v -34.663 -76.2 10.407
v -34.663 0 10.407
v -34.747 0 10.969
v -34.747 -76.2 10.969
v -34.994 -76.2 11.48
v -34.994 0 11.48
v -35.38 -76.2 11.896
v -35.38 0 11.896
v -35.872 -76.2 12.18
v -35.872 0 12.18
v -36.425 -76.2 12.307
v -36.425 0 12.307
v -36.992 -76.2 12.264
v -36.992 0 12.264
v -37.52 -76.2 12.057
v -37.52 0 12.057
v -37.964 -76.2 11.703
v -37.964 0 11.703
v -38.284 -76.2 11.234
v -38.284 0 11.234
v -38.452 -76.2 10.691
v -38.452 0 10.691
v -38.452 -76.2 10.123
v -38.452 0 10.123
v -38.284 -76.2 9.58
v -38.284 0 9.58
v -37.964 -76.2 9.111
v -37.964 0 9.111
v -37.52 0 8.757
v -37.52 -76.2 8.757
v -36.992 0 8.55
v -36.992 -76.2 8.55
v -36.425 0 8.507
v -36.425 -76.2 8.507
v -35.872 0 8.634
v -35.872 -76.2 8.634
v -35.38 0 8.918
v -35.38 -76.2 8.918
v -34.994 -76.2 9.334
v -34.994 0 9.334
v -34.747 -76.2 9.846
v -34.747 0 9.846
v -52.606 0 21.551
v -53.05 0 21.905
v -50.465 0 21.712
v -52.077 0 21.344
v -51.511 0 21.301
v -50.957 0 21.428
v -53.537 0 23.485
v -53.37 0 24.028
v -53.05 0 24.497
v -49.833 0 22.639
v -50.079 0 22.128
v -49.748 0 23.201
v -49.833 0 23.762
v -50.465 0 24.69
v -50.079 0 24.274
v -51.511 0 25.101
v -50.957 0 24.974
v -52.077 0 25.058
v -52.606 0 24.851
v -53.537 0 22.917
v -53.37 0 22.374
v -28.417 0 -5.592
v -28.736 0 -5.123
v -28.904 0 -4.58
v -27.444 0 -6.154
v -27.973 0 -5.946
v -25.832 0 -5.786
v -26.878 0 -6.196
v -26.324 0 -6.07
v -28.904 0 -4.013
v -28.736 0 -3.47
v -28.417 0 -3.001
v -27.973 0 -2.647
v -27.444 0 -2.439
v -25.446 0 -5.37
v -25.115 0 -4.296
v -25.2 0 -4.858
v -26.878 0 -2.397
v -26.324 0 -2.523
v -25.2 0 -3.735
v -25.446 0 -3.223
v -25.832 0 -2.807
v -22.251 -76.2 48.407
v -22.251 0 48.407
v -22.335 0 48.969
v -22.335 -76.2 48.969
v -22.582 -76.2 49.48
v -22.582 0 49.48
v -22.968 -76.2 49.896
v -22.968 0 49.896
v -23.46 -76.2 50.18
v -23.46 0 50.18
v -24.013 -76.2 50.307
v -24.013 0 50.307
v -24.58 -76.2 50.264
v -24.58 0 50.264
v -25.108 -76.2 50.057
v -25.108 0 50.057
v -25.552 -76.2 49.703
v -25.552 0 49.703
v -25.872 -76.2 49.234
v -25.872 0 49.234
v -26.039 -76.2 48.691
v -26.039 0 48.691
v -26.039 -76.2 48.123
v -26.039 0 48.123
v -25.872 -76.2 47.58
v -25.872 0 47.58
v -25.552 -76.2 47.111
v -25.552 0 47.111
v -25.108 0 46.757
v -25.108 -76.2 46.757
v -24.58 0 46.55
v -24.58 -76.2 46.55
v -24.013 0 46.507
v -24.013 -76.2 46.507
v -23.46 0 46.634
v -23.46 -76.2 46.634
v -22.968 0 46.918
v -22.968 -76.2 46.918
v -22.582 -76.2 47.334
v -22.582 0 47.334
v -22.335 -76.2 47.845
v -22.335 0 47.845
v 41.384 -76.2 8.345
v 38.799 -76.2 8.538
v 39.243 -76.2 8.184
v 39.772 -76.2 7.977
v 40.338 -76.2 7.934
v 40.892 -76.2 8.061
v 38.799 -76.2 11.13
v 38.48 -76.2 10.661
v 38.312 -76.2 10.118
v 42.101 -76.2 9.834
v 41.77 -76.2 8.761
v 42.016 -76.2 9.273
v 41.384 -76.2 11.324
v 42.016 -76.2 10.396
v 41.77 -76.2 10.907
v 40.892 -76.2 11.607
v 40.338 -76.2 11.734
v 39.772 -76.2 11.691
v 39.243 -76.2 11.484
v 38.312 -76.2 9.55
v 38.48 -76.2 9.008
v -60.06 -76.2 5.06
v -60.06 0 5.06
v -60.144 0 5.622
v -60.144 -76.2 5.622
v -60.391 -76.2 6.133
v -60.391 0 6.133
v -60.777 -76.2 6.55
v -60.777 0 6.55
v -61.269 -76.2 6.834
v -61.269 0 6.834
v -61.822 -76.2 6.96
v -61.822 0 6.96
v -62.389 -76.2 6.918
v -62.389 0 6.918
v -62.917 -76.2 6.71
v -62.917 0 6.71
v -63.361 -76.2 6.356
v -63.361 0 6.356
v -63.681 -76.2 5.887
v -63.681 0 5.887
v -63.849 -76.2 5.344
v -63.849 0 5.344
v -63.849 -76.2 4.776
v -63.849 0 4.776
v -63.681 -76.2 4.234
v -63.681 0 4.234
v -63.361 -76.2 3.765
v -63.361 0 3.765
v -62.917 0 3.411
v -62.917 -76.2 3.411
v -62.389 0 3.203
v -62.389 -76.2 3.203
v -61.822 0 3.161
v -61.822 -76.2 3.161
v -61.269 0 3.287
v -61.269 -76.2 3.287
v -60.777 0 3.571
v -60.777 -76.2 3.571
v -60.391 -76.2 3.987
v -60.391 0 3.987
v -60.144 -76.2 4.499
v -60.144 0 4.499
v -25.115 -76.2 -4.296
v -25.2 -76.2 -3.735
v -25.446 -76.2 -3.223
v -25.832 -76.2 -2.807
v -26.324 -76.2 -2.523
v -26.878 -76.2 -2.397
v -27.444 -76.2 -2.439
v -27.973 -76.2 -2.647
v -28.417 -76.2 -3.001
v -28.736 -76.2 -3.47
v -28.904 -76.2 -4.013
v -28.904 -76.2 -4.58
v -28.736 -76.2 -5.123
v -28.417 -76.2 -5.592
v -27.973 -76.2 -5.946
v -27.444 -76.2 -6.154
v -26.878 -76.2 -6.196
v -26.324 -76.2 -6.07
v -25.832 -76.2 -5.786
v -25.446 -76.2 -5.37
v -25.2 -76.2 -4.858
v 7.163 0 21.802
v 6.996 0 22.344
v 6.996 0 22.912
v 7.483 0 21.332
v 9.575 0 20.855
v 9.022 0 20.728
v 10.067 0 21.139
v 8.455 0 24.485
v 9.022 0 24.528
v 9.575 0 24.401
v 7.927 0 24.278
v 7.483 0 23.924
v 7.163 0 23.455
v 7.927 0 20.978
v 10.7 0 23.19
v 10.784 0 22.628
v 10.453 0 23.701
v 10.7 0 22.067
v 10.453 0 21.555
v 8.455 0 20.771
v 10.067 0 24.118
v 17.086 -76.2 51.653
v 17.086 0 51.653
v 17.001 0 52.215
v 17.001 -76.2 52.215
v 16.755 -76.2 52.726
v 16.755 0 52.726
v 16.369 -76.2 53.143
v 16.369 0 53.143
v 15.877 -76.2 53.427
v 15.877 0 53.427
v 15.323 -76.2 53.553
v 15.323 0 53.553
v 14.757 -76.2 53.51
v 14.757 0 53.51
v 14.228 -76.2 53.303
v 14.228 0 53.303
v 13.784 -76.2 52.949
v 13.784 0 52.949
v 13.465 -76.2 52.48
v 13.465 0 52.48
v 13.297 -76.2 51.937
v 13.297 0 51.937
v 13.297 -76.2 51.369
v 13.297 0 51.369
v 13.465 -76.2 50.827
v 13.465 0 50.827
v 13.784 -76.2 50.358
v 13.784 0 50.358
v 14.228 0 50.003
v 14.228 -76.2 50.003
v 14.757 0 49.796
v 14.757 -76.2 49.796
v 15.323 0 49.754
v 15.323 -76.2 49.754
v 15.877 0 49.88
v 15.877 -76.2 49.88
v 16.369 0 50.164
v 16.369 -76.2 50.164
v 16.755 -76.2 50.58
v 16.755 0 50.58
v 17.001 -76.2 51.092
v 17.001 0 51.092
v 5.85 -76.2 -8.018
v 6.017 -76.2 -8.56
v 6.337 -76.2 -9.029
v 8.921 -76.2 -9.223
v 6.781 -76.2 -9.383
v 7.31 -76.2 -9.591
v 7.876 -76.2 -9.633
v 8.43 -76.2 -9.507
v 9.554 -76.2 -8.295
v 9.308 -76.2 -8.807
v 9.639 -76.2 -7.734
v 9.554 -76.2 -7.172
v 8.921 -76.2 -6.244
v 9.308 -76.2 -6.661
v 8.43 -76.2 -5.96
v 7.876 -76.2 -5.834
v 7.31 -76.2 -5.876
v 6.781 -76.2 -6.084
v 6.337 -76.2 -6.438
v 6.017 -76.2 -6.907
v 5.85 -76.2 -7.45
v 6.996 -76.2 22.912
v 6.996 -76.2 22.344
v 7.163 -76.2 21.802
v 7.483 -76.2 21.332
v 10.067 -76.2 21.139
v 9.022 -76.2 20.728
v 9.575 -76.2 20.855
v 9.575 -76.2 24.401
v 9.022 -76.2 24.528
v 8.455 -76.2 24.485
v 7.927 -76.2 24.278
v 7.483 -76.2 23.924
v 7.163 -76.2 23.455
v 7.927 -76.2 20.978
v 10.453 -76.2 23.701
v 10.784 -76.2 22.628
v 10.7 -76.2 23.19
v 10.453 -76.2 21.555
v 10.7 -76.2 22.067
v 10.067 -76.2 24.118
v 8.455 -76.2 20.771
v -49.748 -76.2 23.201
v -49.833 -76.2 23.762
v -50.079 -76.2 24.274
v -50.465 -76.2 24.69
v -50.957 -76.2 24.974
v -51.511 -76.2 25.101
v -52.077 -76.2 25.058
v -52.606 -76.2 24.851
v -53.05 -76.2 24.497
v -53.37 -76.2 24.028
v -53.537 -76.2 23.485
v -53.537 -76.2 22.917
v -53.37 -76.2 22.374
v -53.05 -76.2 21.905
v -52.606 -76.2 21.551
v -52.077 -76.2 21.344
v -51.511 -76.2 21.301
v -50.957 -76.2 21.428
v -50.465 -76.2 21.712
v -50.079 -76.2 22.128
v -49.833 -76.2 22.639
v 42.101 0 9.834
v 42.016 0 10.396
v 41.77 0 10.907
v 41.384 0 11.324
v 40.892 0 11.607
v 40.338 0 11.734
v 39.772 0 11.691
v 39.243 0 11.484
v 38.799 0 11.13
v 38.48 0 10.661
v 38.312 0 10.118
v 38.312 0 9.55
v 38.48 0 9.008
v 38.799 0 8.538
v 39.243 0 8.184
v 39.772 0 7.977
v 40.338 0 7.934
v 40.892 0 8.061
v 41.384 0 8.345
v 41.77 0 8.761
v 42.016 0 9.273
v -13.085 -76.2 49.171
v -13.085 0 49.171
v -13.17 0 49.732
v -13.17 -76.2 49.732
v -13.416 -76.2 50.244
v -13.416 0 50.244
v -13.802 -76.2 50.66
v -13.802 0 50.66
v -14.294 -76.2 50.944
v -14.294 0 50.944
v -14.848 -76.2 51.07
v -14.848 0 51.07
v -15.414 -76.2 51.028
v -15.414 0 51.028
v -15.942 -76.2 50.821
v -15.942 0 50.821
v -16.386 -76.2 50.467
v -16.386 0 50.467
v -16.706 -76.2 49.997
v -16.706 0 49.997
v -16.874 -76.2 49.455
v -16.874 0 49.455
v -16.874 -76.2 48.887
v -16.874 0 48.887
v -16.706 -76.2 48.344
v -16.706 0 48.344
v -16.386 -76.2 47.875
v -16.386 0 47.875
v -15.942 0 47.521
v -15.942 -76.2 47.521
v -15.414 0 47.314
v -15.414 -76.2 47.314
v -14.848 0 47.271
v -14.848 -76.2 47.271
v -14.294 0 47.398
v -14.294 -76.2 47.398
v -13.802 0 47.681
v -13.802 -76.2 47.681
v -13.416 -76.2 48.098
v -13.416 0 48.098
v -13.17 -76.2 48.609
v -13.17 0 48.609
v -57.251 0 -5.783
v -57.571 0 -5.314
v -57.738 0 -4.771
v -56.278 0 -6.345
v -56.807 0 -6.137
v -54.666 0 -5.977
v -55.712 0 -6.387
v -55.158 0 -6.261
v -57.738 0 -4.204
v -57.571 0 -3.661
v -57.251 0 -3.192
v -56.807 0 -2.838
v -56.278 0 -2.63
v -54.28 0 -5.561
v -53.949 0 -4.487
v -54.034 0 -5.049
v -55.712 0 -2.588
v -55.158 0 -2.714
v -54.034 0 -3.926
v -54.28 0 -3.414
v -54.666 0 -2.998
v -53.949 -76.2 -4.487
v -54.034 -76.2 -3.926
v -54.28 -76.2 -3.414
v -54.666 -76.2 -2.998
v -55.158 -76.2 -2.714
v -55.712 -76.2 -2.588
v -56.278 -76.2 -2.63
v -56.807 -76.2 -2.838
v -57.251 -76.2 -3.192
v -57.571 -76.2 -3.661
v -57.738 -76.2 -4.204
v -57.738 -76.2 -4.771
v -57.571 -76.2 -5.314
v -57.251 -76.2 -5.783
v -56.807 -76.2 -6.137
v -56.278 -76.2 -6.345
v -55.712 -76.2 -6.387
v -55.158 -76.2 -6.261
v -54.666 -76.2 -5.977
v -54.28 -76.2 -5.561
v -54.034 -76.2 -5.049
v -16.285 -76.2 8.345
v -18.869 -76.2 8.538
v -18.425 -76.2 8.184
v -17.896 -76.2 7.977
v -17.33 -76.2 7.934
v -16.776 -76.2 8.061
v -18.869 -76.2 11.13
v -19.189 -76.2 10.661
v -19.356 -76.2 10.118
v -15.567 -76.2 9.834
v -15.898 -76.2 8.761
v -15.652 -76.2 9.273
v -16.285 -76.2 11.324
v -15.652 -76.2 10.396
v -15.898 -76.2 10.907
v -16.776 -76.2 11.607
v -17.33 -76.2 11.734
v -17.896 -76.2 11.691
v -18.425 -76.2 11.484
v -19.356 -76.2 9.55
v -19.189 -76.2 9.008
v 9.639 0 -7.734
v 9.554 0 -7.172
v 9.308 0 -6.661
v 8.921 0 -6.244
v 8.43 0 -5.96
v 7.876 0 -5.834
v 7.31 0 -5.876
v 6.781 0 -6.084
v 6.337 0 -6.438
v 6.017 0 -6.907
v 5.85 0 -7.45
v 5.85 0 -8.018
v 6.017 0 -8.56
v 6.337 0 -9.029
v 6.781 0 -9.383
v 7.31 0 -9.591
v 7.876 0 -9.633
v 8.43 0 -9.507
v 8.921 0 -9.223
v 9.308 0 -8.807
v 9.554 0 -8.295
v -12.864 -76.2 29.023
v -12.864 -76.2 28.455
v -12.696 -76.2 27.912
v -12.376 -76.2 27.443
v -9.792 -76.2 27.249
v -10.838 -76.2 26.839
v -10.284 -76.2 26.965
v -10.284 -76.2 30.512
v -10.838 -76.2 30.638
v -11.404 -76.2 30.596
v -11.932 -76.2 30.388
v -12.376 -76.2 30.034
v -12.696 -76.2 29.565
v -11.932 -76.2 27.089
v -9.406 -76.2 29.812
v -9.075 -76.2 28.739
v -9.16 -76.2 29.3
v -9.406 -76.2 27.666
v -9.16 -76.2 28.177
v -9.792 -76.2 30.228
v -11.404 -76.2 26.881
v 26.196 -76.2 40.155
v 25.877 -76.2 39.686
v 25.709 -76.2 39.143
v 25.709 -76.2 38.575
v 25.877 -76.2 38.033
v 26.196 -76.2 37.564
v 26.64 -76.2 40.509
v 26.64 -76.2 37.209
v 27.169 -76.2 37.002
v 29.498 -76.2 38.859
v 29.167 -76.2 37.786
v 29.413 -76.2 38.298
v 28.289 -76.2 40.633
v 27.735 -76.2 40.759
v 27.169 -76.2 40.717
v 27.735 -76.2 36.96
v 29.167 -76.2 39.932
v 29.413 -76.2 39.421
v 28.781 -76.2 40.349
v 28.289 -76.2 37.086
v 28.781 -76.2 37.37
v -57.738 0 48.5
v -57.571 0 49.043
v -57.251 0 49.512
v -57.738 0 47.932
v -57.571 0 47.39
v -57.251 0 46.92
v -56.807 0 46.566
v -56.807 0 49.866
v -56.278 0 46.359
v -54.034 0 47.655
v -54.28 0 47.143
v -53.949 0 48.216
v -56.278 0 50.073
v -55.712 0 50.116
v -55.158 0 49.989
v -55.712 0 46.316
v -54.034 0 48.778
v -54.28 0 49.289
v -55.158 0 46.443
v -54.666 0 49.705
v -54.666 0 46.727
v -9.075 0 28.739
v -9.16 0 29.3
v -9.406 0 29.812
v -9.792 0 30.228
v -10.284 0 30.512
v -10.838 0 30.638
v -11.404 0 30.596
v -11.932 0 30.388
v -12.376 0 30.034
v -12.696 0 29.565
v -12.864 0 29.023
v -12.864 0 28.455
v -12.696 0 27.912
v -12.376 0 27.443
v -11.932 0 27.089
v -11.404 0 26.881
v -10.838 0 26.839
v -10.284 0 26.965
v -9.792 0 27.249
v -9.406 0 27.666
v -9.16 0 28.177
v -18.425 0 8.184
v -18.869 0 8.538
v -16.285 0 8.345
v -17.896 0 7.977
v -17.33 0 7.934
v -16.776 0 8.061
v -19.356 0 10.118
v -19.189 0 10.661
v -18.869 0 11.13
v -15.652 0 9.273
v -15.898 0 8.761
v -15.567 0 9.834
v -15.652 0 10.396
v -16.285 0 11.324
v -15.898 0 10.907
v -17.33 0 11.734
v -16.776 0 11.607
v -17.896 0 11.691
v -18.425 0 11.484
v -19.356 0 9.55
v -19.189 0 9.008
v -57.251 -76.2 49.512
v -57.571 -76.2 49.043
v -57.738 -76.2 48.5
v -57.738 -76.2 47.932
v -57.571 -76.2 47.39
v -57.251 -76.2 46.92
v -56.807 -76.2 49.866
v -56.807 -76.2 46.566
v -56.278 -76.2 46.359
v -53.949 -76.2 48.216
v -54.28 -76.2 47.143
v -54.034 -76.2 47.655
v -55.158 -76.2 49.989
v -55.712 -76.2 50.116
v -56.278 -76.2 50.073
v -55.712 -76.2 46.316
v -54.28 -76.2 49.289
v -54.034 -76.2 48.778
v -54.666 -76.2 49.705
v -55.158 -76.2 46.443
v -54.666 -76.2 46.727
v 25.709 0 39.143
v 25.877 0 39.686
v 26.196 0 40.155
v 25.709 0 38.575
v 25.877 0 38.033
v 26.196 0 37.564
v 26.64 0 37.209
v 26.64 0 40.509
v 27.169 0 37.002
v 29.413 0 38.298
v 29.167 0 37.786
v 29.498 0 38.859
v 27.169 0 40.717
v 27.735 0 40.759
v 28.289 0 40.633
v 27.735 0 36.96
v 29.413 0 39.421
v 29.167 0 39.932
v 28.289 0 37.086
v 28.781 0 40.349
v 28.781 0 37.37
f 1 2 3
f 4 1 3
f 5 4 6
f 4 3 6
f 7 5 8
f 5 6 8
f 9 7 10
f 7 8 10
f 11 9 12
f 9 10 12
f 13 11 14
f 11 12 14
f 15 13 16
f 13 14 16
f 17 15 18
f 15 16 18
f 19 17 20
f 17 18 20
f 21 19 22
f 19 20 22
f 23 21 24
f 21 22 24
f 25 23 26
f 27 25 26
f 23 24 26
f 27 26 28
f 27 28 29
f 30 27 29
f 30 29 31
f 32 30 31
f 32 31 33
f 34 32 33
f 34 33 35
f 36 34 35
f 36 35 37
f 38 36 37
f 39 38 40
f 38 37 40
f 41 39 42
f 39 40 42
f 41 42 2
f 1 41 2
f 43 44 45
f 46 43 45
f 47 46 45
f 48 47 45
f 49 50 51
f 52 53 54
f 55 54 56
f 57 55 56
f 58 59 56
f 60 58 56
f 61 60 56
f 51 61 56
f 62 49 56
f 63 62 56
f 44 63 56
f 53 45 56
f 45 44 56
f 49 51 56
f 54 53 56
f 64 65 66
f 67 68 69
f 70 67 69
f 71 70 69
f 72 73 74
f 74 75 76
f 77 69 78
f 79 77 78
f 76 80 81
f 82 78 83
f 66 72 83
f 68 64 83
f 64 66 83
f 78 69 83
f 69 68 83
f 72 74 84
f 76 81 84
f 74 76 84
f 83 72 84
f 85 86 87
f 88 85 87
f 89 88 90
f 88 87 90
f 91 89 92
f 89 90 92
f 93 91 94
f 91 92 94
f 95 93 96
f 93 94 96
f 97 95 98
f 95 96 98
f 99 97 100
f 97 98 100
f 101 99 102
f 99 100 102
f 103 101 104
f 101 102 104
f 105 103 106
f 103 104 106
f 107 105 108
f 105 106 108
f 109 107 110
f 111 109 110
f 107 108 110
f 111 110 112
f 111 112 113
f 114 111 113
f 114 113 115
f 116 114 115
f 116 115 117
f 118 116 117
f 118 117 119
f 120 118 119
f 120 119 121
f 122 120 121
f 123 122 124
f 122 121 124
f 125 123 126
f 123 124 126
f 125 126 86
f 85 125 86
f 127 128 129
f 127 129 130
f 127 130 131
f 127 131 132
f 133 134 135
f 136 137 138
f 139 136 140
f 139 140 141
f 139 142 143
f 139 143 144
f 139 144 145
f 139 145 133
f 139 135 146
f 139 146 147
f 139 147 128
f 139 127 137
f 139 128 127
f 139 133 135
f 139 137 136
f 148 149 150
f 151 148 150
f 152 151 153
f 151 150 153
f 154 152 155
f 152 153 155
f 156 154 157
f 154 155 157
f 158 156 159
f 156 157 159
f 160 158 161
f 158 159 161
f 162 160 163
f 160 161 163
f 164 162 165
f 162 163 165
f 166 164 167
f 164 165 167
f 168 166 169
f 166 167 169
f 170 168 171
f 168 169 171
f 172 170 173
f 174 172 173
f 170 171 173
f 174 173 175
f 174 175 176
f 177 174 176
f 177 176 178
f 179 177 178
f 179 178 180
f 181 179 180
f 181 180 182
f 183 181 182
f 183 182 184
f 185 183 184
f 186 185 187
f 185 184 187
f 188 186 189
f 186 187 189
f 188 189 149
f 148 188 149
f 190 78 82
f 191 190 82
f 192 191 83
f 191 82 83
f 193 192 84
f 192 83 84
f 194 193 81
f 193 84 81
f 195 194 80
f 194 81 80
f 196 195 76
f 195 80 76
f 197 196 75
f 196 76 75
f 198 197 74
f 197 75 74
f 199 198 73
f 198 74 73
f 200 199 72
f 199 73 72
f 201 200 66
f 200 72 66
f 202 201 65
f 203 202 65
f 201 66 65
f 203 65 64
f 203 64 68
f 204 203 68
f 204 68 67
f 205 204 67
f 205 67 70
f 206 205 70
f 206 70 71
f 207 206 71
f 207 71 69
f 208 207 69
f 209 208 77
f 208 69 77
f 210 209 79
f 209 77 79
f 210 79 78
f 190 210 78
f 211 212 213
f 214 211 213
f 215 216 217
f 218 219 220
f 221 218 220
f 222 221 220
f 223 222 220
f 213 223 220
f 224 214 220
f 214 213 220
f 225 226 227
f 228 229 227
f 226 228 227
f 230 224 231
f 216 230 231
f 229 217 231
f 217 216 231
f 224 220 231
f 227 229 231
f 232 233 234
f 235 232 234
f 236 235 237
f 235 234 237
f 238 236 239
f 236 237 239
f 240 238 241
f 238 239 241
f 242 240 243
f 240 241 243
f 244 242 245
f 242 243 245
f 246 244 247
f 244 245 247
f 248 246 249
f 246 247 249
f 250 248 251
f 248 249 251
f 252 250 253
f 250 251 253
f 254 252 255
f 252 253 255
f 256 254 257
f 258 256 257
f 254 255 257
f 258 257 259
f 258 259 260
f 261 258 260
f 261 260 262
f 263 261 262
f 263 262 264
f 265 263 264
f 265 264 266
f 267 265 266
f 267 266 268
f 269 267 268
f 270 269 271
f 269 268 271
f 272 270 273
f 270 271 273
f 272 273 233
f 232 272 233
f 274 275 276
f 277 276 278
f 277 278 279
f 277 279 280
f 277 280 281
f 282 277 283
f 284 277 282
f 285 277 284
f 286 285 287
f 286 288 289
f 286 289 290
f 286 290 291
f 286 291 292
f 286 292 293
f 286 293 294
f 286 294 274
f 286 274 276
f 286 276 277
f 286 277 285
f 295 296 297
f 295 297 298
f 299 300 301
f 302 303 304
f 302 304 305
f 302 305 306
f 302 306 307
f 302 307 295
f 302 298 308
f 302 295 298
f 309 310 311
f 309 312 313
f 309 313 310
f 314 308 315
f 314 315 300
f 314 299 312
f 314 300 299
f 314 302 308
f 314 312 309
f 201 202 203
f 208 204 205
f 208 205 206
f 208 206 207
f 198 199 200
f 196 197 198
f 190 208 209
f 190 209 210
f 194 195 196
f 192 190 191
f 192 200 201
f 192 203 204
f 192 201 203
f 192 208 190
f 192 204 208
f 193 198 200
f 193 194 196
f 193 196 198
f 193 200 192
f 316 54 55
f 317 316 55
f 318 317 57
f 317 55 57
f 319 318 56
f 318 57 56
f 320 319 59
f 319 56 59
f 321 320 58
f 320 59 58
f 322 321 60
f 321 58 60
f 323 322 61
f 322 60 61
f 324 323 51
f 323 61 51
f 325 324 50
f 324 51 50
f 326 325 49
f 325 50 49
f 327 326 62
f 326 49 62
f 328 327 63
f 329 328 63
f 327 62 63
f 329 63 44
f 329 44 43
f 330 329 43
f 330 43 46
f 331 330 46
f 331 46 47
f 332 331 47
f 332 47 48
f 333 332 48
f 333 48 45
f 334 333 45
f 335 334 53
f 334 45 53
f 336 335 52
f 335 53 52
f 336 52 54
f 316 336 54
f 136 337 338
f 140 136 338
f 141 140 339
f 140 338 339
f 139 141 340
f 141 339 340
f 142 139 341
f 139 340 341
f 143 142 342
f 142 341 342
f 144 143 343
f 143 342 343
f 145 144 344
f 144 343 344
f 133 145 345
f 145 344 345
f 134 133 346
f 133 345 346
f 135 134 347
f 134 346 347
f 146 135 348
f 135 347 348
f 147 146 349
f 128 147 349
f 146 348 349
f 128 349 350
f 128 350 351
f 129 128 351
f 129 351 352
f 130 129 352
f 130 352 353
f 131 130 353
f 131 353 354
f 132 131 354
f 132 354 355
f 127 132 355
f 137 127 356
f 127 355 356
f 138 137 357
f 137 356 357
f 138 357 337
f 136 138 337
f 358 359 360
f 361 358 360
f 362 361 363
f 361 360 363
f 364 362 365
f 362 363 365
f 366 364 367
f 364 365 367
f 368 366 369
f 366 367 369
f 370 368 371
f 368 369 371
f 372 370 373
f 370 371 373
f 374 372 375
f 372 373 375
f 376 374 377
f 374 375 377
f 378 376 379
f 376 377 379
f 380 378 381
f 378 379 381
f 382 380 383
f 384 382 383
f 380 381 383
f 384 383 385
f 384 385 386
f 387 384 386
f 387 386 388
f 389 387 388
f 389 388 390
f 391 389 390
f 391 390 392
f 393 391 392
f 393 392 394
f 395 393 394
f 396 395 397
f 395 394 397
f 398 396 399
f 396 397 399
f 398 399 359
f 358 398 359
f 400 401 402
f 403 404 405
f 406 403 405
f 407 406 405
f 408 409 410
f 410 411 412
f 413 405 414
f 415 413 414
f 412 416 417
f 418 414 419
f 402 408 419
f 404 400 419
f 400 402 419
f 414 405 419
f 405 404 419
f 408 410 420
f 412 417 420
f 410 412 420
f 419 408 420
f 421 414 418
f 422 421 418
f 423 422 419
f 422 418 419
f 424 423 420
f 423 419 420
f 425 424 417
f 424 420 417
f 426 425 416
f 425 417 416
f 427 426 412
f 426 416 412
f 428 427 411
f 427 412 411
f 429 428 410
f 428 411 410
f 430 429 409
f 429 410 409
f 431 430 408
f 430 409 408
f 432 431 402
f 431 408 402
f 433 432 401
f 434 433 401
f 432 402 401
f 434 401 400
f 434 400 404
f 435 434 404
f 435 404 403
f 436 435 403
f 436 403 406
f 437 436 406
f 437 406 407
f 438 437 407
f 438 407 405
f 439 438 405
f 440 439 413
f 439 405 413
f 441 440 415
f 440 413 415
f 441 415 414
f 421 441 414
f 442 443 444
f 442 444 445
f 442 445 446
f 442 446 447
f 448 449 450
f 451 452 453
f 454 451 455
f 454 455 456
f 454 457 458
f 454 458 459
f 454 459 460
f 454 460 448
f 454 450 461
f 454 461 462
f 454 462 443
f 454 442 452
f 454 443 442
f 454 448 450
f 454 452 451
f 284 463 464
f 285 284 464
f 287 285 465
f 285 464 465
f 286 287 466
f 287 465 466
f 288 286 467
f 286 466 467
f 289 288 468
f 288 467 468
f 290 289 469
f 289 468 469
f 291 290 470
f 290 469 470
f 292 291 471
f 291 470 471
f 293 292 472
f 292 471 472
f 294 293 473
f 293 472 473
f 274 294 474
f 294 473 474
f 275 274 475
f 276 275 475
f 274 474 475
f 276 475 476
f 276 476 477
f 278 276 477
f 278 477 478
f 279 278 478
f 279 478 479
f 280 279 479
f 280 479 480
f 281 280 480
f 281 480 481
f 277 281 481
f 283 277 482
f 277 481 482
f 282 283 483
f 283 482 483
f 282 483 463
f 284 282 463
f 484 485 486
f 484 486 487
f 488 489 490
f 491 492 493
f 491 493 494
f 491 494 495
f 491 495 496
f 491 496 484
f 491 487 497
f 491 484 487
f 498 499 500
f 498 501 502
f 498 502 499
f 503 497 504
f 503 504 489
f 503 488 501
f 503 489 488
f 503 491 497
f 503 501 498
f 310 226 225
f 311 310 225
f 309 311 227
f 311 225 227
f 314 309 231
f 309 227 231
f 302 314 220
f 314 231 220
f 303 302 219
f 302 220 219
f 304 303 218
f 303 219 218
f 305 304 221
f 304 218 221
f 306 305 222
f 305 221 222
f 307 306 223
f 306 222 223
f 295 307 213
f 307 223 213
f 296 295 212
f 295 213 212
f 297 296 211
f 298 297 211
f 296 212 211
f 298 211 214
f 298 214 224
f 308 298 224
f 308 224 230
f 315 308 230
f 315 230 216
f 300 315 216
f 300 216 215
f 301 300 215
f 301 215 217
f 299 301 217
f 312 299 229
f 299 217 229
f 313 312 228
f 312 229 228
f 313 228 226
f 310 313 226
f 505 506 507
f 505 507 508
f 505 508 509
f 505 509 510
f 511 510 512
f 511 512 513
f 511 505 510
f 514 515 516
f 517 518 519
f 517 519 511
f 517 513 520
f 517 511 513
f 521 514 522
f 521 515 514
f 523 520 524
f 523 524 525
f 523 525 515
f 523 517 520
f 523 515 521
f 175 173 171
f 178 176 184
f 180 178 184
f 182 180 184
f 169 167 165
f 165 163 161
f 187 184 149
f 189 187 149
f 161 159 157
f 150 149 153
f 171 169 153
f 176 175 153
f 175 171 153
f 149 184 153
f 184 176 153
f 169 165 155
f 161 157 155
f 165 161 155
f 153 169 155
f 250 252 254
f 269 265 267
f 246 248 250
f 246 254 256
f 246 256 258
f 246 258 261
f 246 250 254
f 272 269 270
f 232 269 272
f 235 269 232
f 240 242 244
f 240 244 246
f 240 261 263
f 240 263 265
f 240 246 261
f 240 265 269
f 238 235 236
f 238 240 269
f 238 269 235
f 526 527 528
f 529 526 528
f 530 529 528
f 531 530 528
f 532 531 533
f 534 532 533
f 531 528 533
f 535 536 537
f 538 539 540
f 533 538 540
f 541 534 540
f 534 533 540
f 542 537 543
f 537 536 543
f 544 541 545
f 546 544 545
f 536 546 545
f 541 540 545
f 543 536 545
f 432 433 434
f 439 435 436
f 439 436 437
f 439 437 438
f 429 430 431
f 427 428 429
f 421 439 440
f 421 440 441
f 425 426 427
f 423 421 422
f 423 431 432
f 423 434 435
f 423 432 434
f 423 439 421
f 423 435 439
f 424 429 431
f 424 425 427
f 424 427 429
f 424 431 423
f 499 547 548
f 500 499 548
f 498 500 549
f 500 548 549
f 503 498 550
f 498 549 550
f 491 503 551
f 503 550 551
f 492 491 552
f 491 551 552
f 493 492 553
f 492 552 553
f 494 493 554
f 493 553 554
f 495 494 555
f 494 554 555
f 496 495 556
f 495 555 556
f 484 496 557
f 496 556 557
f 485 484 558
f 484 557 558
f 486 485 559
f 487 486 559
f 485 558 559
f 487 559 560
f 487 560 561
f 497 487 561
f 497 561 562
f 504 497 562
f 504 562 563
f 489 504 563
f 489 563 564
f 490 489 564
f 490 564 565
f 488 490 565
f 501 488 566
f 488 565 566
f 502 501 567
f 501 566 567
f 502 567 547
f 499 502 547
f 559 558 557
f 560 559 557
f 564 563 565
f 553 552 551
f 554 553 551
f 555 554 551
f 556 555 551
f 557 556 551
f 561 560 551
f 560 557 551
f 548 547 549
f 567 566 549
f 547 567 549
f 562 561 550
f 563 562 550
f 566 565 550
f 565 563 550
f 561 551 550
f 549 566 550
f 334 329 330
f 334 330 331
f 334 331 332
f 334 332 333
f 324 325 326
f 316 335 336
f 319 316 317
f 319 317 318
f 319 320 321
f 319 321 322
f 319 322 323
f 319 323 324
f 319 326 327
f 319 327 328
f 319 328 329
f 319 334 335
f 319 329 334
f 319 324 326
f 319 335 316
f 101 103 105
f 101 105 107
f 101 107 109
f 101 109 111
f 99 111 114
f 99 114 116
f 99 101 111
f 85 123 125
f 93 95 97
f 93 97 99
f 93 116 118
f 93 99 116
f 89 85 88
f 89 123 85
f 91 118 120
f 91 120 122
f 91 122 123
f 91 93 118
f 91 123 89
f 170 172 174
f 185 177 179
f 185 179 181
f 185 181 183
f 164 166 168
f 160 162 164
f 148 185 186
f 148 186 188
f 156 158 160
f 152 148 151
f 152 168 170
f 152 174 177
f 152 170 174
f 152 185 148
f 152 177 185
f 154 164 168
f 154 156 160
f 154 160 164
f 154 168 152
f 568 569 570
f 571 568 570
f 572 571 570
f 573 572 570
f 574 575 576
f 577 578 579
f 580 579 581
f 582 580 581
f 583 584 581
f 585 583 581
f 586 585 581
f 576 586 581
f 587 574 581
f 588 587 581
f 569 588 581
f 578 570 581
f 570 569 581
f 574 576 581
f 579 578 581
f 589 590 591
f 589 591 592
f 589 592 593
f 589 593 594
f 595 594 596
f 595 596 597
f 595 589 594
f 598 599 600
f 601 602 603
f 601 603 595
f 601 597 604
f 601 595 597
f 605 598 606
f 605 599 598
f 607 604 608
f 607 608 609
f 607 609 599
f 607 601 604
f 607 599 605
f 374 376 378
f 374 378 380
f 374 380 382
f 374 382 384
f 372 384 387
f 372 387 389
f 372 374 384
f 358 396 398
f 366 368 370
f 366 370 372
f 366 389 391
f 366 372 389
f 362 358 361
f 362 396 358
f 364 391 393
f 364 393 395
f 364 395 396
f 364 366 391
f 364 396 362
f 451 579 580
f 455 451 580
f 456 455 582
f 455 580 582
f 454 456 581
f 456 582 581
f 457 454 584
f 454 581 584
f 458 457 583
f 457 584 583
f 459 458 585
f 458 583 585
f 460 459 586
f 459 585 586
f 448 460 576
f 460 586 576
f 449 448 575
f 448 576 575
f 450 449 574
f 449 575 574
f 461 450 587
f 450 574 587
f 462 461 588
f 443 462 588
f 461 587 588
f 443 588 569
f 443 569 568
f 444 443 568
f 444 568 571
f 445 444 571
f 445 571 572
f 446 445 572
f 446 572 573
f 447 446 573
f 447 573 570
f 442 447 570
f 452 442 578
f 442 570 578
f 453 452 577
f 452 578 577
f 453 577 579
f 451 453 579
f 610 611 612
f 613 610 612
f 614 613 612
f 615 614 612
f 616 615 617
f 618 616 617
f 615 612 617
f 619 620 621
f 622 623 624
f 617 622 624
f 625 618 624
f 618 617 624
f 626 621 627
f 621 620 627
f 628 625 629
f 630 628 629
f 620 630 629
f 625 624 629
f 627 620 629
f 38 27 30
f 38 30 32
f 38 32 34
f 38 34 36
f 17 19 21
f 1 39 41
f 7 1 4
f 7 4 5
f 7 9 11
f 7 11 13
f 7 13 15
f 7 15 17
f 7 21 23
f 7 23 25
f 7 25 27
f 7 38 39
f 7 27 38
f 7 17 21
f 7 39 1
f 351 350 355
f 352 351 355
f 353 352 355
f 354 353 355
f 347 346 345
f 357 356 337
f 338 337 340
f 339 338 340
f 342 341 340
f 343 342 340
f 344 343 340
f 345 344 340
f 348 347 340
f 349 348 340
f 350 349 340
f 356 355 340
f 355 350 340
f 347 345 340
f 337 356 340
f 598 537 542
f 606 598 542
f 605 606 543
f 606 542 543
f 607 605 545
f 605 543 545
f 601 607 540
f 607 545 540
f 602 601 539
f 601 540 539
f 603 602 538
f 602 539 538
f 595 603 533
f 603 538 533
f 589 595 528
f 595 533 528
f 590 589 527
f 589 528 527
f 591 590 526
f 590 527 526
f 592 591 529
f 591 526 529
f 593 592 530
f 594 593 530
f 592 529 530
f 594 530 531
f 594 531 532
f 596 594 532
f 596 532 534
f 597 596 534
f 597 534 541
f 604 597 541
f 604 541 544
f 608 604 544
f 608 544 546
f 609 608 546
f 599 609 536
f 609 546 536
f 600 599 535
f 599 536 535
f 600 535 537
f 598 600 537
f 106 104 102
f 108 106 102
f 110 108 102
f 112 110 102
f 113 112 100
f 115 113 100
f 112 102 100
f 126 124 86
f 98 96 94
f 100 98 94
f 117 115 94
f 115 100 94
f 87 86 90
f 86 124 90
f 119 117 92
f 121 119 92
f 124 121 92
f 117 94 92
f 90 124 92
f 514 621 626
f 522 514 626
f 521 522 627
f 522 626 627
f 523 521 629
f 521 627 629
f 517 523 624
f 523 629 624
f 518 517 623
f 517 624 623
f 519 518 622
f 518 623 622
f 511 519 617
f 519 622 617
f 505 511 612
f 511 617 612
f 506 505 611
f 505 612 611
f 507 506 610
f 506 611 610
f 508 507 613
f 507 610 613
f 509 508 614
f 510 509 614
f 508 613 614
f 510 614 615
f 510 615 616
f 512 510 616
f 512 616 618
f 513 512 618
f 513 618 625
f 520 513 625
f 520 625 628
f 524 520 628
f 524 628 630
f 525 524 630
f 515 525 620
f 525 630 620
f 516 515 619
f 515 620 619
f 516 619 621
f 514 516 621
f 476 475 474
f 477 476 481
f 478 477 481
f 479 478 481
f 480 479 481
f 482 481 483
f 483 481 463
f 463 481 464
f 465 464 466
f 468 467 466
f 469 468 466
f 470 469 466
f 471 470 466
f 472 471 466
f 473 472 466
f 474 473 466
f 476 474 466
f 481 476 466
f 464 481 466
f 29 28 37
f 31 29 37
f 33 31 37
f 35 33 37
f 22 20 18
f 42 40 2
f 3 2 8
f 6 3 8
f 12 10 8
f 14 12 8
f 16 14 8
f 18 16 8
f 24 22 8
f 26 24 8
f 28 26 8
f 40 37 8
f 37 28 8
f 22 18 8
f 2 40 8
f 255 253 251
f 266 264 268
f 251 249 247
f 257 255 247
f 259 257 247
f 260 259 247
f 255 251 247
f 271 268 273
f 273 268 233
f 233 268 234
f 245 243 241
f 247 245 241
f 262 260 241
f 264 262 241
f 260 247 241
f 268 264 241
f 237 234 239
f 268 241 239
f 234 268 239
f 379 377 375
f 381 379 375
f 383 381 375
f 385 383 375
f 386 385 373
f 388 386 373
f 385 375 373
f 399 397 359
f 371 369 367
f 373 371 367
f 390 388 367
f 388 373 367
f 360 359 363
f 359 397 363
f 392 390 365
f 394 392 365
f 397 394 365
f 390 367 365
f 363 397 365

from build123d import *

# Parameters (mm, degrees)
F0_R     = 1.905
F1_DEPTH = 76.2


with BuildPart() as f1:
    # F0 (on Front) → F1 (new body)
    with BuildSketch(Plane.XZ):
        with Locations((-17.472351, 9.834165)):
            Circle(F0_R)
        with Locations((-10.979893, 28.738678)):
            Circle(F0_R)
        with Locations((-14.98994, 49.170822)):
            Circle(F0_R)
        with Locations((-24.155764, 48.407007)):
            Circle(F0_R)
        with Locations((-55.854239, 48.216052)):
            Circle(F0_R)
        with Locations((-51.653236, 23.200989)):
            Circle(F0_R)
        with Locations((-61.964784, 5.060298)):
            Circle(F0_R)
        with Locations((-55.854239, -4.487434)):
            Circle(F0_R)
        with Locations((-36.567815, 10.407029)):
            Circle(F0_R)
        with Locations((-27.020084, -4.29648)):
            Circle(F0_R)
        with Locations((7.733663, -7.733664)):
            Circle(F0_R)
        with Locations((8.879391, 22.628127)):
            Circle(F0_R)
        with Locations((15.180895, 51.653232)):
            Circle(F0_R)
        with Locations((27.592946, 38.859274)):
            Circle(F0_R)
        with Locations((40.195953, 9.834165)):
            Circle(F0_R)
    extrude(amount=F1_DEPTH)


solid = f1.part
